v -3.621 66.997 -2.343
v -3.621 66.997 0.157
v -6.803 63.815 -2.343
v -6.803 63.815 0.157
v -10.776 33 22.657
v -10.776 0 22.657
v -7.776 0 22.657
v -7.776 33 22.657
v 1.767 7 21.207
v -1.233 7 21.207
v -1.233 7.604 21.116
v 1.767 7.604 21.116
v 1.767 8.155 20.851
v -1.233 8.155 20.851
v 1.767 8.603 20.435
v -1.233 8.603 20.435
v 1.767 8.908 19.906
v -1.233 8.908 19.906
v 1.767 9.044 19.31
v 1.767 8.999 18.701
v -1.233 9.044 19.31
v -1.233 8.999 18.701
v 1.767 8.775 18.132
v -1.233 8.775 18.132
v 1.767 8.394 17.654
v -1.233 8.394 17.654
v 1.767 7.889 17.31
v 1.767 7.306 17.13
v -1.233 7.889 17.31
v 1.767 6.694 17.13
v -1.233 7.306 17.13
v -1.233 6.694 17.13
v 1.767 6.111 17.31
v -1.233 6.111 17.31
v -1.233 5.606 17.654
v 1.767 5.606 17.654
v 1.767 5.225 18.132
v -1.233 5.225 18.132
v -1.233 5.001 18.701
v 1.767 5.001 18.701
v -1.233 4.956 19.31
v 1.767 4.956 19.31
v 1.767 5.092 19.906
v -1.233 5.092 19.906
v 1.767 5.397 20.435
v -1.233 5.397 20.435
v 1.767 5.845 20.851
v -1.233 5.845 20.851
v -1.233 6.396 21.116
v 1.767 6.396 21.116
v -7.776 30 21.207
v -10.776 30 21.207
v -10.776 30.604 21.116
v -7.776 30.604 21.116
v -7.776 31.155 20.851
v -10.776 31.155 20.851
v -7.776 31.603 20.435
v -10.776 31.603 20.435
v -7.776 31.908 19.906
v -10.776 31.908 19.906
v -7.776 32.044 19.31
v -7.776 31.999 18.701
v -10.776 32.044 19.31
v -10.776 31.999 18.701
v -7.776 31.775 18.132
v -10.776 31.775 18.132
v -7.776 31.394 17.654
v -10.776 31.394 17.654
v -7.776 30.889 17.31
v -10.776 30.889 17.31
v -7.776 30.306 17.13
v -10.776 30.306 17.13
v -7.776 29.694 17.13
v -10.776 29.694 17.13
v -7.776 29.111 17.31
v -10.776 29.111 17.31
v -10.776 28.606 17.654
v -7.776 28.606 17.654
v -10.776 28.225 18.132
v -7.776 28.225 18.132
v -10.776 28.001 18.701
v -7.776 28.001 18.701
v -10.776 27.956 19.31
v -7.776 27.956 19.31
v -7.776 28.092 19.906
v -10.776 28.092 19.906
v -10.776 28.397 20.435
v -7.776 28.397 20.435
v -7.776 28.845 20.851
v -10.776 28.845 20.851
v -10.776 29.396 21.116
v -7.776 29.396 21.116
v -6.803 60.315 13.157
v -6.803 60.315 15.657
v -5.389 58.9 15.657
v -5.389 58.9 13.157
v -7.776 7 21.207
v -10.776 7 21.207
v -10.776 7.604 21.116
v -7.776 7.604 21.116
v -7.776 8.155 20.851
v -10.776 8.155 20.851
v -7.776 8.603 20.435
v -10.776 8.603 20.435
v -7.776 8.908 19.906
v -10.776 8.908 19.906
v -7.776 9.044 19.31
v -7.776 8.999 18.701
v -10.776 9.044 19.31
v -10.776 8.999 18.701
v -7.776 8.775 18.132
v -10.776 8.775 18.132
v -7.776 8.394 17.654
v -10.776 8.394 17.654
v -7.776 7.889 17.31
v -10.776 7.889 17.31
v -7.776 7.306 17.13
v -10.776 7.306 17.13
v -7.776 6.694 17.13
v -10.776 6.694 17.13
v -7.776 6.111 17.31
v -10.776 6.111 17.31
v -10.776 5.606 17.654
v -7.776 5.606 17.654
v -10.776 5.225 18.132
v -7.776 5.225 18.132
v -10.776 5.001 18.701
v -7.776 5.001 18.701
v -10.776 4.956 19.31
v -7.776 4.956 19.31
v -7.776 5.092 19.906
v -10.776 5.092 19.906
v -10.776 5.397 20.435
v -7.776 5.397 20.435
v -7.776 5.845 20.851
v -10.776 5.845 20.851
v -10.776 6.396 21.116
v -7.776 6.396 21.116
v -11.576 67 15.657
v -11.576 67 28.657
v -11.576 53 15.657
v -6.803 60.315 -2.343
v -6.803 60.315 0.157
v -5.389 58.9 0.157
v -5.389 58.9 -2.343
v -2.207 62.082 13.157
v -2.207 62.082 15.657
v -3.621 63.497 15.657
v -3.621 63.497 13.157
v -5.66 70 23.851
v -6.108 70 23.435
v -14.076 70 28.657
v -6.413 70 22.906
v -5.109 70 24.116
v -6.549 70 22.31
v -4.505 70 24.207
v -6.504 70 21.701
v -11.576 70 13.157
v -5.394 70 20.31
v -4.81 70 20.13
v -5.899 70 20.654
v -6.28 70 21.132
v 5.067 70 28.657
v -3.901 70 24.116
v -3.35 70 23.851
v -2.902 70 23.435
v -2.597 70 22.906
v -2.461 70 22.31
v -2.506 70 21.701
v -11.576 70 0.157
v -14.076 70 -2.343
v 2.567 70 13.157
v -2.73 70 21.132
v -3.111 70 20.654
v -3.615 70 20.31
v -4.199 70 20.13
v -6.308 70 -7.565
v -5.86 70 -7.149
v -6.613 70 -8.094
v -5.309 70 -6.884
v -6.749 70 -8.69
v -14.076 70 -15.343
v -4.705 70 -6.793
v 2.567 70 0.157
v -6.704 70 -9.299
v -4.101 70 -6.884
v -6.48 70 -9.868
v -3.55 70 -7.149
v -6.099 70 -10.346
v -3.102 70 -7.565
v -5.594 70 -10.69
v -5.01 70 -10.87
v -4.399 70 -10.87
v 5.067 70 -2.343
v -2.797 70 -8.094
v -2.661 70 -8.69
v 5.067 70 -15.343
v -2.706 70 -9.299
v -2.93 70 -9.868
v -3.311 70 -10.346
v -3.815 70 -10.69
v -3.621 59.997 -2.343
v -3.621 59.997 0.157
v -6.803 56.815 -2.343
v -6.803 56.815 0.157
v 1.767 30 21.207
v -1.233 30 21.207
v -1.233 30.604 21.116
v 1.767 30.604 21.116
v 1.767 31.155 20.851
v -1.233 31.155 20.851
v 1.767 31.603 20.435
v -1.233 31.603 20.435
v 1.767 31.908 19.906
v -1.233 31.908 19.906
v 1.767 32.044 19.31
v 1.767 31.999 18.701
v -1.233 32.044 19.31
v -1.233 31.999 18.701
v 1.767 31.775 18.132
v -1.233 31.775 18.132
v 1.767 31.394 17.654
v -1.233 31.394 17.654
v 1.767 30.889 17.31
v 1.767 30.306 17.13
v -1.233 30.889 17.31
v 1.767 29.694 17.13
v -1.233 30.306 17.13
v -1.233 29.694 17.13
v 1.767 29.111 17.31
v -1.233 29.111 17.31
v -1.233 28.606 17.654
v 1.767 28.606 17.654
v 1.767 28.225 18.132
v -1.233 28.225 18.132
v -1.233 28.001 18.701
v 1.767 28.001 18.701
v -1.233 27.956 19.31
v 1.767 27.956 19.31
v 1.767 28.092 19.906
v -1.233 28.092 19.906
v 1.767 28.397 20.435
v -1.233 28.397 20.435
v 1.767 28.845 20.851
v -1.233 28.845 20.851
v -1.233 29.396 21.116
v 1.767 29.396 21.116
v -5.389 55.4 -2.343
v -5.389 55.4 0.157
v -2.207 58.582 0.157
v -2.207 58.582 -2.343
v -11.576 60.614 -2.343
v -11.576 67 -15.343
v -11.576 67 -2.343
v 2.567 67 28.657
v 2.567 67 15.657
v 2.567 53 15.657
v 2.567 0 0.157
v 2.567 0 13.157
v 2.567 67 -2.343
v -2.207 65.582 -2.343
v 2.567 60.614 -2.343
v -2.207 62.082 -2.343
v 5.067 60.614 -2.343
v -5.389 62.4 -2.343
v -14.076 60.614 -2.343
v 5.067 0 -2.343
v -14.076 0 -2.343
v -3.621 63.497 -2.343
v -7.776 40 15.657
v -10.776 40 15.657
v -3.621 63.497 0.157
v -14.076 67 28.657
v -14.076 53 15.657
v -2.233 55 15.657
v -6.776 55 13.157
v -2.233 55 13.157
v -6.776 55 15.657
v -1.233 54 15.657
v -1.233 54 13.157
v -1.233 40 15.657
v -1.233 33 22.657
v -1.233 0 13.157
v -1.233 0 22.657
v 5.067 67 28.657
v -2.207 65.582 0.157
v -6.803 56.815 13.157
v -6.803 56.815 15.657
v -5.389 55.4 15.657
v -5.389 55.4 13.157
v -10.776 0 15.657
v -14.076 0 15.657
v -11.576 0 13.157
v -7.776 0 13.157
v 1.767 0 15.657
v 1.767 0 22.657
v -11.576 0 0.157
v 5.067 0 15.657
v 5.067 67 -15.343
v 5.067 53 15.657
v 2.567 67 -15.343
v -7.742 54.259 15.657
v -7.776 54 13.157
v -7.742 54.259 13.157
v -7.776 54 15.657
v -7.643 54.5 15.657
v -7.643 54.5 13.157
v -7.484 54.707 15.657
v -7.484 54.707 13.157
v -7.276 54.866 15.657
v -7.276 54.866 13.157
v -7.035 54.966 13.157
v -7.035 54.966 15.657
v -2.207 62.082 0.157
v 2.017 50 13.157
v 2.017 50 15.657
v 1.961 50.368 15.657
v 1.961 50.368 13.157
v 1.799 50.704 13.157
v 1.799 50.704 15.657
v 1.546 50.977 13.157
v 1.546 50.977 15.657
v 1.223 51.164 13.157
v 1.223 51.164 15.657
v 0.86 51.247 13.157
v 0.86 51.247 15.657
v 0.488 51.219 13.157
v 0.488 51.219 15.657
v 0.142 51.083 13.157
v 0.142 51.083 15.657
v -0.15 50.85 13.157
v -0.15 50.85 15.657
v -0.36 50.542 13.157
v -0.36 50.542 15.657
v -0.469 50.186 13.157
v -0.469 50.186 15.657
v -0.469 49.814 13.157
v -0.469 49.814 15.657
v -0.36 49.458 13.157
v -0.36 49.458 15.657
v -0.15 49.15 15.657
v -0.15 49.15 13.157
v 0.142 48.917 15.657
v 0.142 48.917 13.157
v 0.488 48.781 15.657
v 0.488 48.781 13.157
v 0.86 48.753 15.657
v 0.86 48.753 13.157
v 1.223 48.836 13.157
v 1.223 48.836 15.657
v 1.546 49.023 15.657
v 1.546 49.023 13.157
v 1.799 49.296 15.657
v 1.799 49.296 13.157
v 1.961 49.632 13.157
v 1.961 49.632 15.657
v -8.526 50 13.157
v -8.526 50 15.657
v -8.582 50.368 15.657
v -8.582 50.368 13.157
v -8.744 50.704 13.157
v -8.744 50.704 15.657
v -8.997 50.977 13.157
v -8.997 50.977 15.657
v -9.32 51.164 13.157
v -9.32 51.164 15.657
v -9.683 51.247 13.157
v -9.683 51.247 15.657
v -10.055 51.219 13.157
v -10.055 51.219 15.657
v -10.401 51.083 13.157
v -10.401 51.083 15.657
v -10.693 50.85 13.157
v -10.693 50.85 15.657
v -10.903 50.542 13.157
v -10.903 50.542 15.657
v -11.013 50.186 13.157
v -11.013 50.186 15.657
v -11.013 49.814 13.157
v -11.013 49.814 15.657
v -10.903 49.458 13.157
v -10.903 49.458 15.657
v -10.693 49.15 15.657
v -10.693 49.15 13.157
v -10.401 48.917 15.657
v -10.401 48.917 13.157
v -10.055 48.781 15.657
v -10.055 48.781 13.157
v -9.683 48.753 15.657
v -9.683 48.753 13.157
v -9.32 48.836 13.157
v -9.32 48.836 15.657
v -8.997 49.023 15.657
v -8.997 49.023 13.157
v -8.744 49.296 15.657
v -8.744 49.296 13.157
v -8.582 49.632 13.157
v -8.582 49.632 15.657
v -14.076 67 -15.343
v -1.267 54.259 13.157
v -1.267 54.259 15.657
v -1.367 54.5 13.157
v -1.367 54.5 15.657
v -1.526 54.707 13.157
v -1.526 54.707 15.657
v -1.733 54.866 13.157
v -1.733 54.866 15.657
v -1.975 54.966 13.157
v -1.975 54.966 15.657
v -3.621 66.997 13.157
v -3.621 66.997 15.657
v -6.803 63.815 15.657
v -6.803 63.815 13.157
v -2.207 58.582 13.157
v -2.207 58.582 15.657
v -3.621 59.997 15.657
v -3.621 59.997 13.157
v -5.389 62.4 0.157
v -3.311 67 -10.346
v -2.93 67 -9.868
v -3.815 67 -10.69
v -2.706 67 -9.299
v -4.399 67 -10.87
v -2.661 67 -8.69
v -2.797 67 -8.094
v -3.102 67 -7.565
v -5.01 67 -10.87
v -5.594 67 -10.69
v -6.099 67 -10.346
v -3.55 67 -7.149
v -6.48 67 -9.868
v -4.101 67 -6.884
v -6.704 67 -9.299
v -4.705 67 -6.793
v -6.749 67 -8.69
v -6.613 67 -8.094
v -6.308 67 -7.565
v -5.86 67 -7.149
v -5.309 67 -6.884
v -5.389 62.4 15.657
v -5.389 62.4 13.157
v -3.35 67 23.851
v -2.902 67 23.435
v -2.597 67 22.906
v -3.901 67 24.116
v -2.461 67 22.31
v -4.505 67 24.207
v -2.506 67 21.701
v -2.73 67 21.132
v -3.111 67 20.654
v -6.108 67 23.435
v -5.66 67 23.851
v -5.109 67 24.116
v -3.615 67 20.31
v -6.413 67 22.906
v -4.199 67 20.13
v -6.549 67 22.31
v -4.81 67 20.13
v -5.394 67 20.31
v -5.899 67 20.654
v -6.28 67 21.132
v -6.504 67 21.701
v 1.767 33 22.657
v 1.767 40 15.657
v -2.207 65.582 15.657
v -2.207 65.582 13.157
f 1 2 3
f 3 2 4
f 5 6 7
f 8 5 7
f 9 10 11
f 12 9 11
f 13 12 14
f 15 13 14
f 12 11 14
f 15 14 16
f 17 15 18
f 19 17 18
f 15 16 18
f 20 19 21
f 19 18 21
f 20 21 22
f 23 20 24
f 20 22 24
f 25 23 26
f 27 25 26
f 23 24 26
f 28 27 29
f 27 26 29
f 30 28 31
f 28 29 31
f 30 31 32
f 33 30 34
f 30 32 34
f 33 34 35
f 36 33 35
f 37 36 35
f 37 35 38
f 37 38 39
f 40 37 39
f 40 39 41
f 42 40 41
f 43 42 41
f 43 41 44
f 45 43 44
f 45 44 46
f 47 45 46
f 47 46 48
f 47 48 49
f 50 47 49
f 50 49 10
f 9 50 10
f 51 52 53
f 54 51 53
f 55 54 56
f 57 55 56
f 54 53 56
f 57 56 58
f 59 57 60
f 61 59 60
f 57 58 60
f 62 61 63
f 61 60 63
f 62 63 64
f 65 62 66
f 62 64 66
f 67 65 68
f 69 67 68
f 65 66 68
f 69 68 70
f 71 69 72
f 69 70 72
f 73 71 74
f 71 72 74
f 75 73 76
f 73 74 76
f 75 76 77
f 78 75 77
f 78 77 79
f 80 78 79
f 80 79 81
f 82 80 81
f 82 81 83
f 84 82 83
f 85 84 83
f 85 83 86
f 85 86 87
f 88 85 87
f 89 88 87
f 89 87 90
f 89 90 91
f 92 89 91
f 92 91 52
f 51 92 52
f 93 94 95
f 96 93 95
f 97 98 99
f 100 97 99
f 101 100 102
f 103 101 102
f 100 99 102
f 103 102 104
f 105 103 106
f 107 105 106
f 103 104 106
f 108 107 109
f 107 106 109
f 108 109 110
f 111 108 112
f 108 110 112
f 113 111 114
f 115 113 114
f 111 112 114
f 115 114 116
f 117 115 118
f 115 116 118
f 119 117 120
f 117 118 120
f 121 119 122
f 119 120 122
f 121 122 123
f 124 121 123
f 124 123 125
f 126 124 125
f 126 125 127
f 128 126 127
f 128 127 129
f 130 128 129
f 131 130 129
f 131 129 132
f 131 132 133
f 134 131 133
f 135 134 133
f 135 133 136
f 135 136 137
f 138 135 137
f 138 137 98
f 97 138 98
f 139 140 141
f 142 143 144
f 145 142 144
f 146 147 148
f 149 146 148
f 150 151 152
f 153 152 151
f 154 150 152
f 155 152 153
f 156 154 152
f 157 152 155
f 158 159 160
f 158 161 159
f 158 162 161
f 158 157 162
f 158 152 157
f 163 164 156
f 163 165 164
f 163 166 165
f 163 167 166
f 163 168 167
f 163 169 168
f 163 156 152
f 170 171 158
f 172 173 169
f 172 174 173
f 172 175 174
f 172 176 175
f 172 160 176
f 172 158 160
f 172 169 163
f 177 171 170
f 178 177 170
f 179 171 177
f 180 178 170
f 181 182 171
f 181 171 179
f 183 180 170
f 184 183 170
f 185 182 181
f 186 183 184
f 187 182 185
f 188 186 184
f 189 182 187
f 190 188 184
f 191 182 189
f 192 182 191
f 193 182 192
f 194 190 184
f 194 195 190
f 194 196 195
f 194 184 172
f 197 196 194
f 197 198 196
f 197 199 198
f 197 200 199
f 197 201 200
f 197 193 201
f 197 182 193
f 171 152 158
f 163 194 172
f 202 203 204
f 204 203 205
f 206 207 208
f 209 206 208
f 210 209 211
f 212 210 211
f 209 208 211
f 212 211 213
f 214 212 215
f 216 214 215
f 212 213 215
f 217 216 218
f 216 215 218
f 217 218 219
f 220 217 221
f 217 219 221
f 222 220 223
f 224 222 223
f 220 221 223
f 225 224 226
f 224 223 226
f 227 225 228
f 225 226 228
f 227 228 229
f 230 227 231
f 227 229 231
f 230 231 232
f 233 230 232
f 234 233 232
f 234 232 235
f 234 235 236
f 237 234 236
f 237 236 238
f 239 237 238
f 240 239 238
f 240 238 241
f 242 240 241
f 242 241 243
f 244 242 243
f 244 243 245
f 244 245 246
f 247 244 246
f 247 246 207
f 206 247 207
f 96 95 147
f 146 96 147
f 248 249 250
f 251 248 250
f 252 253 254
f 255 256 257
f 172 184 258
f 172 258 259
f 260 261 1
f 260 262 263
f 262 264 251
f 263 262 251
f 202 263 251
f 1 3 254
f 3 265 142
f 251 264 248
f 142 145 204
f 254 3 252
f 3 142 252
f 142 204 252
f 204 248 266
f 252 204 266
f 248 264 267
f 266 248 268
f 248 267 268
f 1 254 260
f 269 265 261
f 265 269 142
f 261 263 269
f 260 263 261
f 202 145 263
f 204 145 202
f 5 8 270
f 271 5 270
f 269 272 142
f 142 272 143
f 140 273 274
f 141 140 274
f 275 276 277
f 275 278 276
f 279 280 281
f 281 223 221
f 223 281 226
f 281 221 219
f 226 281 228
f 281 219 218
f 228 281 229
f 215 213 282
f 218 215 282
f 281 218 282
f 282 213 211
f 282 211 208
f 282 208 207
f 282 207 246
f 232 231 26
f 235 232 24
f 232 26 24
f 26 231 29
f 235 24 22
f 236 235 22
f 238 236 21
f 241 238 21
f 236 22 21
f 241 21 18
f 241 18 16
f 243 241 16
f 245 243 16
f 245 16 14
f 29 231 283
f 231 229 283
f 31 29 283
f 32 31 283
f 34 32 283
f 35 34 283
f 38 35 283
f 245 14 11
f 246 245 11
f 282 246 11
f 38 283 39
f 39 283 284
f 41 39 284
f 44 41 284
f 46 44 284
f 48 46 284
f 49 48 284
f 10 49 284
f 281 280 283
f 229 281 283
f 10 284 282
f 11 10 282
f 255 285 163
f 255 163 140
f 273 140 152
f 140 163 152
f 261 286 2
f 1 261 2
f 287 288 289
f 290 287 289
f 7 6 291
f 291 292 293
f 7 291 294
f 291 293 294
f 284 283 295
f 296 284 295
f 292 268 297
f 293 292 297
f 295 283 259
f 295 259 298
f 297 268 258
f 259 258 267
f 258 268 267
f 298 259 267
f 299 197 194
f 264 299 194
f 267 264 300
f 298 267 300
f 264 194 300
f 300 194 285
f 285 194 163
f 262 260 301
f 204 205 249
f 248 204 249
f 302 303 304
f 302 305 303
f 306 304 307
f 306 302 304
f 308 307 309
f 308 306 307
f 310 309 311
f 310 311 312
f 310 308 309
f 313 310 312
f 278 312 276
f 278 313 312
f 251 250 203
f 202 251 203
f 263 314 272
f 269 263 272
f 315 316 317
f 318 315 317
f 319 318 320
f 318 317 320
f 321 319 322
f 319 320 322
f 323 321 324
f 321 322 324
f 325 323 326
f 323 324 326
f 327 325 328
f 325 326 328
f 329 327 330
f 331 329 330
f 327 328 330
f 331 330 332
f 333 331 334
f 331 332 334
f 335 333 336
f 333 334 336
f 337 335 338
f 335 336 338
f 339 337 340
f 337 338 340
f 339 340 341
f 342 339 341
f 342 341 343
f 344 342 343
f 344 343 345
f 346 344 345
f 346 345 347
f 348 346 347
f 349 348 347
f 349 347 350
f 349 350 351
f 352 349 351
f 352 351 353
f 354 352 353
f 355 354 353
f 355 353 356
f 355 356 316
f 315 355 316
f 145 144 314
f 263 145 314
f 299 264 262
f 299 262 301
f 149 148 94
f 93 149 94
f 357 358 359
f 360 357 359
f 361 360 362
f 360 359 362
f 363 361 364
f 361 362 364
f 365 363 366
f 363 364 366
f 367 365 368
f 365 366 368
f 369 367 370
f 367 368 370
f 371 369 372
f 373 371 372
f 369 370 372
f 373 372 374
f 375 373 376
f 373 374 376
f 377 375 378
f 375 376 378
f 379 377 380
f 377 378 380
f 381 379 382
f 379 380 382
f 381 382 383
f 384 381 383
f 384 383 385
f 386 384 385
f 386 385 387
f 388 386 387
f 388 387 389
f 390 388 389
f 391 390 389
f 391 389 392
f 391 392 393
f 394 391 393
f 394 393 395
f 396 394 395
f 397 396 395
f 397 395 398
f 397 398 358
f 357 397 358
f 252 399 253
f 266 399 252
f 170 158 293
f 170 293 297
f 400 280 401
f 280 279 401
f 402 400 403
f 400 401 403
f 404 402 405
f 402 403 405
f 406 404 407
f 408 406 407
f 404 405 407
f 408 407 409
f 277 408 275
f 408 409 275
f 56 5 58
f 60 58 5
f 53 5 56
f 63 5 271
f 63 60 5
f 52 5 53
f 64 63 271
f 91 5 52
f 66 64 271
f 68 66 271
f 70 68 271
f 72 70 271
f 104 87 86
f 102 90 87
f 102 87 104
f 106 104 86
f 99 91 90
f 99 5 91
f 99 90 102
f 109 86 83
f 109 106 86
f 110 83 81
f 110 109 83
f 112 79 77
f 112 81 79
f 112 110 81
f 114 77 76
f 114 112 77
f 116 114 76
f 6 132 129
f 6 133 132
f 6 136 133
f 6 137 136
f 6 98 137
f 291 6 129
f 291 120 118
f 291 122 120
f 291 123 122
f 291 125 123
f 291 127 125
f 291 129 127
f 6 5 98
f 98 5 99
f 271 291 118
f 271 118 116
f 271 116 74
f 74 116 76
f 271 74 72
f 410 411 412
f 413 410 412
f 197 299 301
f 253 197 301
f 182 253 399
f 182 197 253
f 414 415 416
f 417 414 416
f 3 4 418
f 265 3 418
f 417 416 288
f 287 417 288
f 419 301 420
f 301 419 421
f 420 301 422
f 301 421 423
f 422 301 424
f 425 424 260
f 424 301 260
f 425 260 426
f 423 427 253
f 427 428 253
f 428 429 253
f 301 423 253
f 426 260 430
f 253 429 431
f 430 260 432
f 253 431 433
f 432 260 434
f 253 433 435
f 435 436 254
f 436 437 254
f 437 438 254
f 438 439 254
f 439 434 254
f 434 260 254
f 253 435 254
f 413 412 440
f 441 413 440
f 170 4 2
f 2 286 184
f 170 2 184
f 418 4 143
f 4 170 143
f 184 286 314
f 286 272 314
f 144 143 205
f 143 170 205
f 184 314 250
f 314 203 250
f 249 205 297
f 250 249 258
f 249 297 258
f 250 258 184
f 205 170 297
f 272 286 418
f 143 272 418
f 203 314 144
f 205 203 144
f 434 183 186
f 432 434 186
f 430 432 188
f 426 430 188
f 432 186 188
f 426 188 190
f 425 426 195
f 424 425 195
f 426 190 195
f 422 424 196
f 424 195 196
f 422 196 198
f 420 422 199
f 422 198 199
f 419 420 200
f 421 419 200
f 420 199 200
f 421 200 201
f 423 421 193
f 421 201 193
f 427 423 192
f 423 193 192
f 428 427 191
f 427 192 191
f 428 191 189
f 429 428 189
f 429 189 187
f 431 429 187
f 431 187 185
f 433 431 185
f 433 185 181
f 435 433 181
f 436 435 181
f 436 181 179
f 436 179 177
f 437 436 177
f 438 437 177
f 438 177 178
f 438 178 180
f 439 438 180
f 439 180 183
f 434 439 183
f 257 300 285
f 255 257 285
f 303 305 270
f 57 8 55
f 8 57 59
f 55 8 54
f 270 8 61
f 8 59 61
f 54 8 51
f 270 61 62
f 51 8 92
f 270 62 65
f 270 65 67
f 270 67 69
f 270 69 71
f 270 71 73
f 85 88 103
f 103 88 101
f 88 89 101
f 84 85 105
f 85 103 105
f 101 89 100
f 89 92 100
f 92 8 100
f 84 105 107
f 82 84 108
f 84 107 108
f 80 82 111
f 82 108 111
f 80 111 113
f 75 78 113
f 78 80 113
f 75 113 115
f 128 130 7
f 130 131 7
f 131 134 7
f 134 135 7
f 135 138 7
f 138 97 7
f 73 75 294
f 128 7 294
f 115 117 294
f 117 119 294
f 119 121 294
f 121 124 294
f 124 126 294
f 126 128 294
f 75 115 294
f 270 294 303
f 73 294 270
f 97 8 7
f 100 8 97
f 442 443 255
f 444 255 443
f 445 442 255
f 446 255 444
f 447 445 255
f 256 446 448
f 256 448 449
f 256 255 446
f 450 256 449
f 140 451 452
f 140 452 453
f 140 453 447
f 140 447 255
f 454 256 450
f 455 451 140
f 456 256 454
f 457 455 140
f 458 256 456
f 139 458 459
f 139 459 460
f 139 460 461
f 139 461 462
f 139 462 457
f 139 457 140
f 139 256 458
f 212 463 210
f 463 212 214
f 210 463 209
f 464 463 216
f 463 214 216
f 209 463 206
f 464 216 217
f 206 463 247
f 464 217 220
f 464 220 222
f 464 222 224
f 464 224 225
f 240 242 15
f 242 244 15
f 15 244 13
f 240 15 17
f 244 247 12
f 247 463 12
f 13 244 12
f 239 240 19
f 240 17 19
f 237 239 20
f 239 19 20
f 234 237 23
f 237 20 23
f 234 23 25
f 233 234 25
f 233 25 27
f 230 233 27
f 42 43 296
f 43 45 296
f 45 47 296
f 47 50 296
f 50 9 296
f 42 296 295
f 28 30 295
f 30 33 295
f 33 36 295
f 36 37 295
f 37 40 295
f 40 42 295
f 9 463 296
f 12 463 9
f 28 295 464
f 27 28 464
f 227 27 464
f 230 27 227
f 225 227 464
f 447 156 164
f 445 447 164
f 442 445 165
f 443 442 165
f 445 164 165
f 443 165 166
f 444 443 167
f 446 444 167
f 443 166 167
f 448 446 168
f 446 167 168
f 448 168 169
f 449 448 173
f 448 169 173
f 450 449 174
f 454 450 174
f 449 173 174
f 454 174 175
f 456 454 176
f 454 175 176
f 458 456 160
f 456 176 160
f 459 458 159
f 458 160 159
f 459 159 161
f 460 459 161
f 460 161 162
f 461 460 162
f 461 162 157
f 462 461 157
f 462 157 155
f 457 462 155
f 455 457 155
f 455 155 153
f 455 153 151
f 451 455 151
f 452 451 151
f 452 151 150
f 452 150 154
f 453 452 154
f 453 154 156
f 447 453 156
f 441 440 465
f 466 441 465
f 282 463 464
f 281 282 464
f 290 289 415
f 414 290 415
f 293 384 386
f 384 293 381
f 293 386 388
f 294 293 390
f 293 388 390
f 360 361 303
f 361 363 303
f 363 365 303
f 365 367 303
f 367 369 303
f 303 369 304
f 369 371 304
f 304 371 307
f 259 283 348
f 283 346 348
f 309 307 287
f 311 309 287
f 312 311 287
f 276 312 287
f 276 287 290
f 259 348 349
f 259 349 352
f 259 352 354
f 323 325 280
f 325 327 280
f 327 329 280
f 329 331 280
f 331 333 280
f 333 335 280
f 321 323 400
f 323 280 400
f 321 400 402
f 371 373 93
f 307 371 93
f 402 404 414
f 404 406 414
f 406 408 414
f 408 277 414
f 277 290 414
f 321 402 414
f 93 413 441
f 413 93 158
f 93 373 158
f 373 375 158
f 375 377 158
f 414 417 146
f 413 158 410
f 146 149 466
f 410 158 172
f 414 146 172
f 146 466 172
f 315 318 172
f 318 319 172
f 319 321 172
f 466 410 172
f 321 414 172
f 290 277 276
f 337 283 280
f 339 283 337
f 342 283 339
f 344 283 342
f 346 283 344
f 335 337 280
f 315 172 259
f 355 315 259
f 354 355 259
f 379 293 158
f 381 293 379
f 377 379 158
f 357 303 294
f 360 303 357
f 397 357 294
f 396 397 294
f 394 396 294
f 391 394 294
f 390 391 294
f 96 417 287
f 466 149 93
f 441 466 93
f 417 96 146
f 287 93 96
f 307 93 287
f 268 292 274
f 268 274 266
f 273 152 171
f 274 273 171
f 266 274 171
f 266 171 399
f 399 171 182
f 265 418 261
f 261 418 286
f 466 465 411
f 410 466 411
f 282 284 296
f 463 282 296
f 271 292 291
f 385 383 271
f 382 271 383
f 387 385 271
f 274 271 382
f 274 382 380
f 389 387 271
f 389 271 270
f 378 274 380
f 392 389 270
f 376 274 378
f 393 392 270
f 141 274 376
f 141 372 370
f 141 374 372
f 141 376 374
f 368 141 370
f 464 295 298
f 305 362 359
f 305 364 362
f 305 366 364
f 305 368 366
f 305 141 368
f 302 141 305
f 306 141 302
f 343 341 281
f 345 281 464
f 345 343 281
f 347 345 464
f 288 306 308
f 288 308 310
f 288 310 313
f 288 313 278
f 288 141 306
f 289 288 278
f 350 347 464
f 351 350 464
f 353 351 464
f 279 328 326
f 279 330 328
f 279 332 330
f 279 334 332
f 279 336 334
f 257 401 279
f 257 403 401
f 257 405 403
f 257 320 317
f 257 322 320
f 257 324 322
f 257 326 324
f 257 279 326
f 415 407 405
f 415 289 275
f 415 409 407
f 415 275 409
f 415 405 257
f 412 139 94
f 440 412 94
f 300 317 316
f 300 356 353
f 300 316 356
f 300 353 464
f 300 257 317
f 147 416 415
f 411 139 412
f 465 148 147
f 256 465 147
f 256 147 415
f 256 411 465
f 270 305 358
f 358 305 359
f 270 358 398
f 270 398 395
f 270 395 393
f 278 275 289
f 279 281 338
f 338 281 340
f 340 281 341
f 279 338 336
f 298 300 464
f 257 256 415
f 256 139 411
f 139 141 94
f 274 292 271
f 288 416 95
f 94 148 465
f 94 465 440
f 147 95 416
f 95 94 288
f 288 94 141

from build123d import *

# Parameters (mm, degrees)
SKETCH2_W                = 2.5
SKETCH2_H                = 2.5
SKETCH2_W_2              = 14.143059905
SKETCH2_H_2              = 13
SKETCH2_W_3              = 3
SKETCH2_H_3              = 7
BOSS_EXTRUDE1_DEPTH      = 40
SKETCH3_R                = 2.05
CUT_EXTRUDE2_DEPTH       = 40
BOSS_EXTRUDE11_DEPTH     = 30
SKETCH16_R               = 1.25
CUT_EXTRUDE9_DEPTH       = 3.5
SKETCH17_R               = 1.25
CUT_EXTRUDE10_DEPTH      = 3.5
SKETCH18_W               = 19.143059905
SKETCH18_H               = 3
BOSS_EXTRUDE4_DEPTH      = 15.5
BOSS_EXTRUDE5_DEPTH      = 13
BOSS_EXTRUDE5_DEPTH_BACK = 2
SKETCH19_W               = 19.143059905
SKETCH19_H               = 3
BOSS_EXTRUDE6_DEPTH      = 2.5
BOSS_EXTRUDE8_DEPTH      = 2.5
BOSS_EXTRUDE9_DEPTH      = 2.5
BOSS_EXTRUDE10_DEPTH     = 2.5
SKETCH25_R               = 2.05
CUT_EXTRUDE12_DEPTH      = 3.5
SKETCH27_W               = 6.543059905
SKETCH27_H               = 2.5
BOSS_EXTRUDE12_DEPTH     = 12
FILLET1_R                = 1
CUT_EXTRUDE13_DEPTH      = 78.840525416
CUT_EXTRUDE14_DEPTH      = 78.280272448


with BuildPart() as part:
    # Sketch2 → Boss-Extrude1 (new body)
    with BuildSketch(Plane(origin=(0, 0, 0), x_dir=(1, 0, 0), z_dir=(0, 1, 0))):
        with Locations((-12.826483829, 1.092750264)):
            Rectangle(SKETCH2_W, SKETCH2_H)
        with Locations((-4.504953877, 1.092750264)):
            Rectangle(SKETCH2_W_2, SKETCH2_H)
        with Locations((-12.826483829, -6.657249736)):
            Rectangle(SKETCH2_W, SKETCH2_H_2)
        with Locations((3.816576076, 1.092750264)):
            Rectangle(SKETCH2_W, SKETCH2_H)
        Polygon((-11.576483829, -13.157249736), (-14.076483829, -13.157249736), (-14.076483829, -15.657249736), (-10.776483829, -15.657249736), (-7.776483829, -15.657249736), (-7.776483829, -13.157249736), align=None)
        with Locations((3.816576076, -6.657249736)):
            Rectangle(SKETCH2_W, SKETCH2_H_2)
        Polygon((5.066576076, -13.157249736), (2.566576076, -13.157249736), (-1.233423924, -13.157249736), (-1.233423924, -15.657249736), (1.766576076, -15.657249736), (5.066576076, -15.657249736), align=None)
        with Locations((-9.276483829, -19.157249736)):
            Rectangle(SKETCH2_W_3, SKETCH2_H_3)
        with Locations((0.266576076, -19.157249736)):
            Rectangle(SKETCH2_W_3, SKETCH2_H_3)
    extrude(amount=BOSS_EXTRUDE1_DEPTH)

    # Sketch3 → Cut-Extrude2 (cut)
    with BuildSketch(Plane.ZY.offset(10.776483829)):
        with Locations((19.157249736, 30)):
            Circle(SKETCH3_R)
        with Locations((19.157249736, 7)):
            Circle(SKETCH3_R)
    extrude(amount=-CUT_EXTRUDE2_DEPTH, mode=Mode.SUBTRACT)

    # Sketch26 → Boss-Extrude11 (add)
    with BuildSketch(Plane(origin=(0, 40, 0), x_dir=(1, 0, 0), z_dir=(0, 1, 0))):
        Polygon((-1.233423924, -15.657249736), (1.766576076, -15.657249736), (5.066576076, -15.657249736), (5.066576076, 2.342750264), (-14.076483829, 2.342750264), (-14.076483829, -15.657249736), (-7.776483829, -15.657249736), (-7.776483829, -13.157249736), (-11.576483829, -13.157249736), (-11.576483829, -0.157249736), (2.566576076, -0.157249736), (2.566576076, -13.157249736), (-1.233423924, -13.157249736), align=None)
    extrude(amount=BOSS_EXTRUDE11_DEPTH)

    # Sketch16 → Cut-Extrude9 (cut)
    with BuildSketch(Plane.XY.offset(15.657249736)):
        with Locations((-9.776483829, 50)):
            Circle(SKETCH16_R)
    extrude(amount=-CUT_EXTRUDE9_DEPTH, mode=Mode.SUBTRACT)

    # Sketch17 → Cut-Extrude10 (cut)
    with BuildSketch(Plane.XY.offset(15.657249736)):
        with Locations((0.766576076, 50)):
            Circle(SKETCH17_R)
    extrude(amount=-CUT_EXTRUDE10_DEPTH, mode=Mode.SUBTRACT)

    # Sketch18 → Boss-Extrude4 (add)
    with BuildSketch(Plane(origin=(0, 0, 13.157249736), x_dir=(-1, 0, 0), z_dir=(0, 0, -1))):
        with Locations((4.504953877, 68.5)):
            Rectangle(SKETCH18_W, SKETCH18_H)
    extrude(amount=-BOSS_EXTRUDE4_DEPTH)

    # Sketch19 → Boss-Extrude5 (add, two sides: drawn at the far end of the back side and taken through both)
    with BuildSketch(Plane(origin=(0, 0, -2.342750264), x_dir=(-1, 0, 0), z_dir=(0, 0, -1)).offset(-BOSS_EXTRUDE5_DEPTH_BACK)):
        with Locations((4.504953877, 68.5)):
            Rectangle(SKETCH19_W, SKETCH19_H)
    extrude(amount=BOSS_EXTRUDE5_DEPTH + BOSS_EXTRUDE5_DEPTH_BACK)

    # Sketch21 → Boss-Extrude6 (add)
    with BuildSketch(Plane.ZY.offset(14.076483829)):
        Polygon((28.657249736, 67), (15.657249736, 53), (15.657249736, 67), align=None)
    extrude(amount=-BOSS_EXTRUDE6_DEPTH)

    # Sketch22 → Boss-Extrude8 (add)
    with BuildSketch(Plane(origin=(5.066576076, 0, 0), x_dir=(0, 0, -1), z_dir=(1, 0, 0))):
        Polygon((-28.657249736, 67), (-15.657249736, 67), (-15.657249736, 53), align=None)
    extrude(amount=-BOSS_EXTRUDE8_DEPTH)

    # Sketch23 → Boss-Extrude9 (add)
    with BuildSketch(Plane(origin=(5.066576076, 0, 0), x_dir=(0, 0, -1), z_dir=(1, 0, 0))):
        Polygon((-13.157249736, 70), (-13.157249736, 53), (15.342750264, 67), (15.342750264, 70), align=None)
    extrude(amount=-BOSS_EXTRUDE9_DEPTH)

    # Sketch24 → Boss-Extrude10 (add)
    with BuildSketch(Plane.ZY.offset(14.076483829)):
        Polygon((13.157249736, 70), (-15.342750264, 70), (-15.342750264, 67), (13.157249736, 53), align=None)
    extrude(amount=-BOSS_EXTRUDE10_DEPTH)

    # Sketch25 → Cut-Extrude12 (cut)
    with BuildSketch(Plane(origin=(0, 70, 0), x_dir=(1, 0, 0), z_dir=(0, 1, 0))):
        with Locations(Location((-4.704953829, 8.842750264, 0), (0, 0, 270))):
            Circle(SKETCH25_R)
        with Locations(Location((-4.504953767, -22.157249736, 0), (0, 0, 270))):
            Circle(SKETCH25_R)
    extrude(amount=-CUT_EXTRUDE12_DEPTH, mode=Mode.SUBTRACT)

    # Sketch27 → Boss-Extrude12 (add)
    with BuildSketch(Plane.XZ.offset(-67)):
        with Locations((-4.504953877, 14.407249736)):
            Rectangle(SKETCH27_W, SKETCH27_H)
    extrude(amount=BOSS_EXTRUDE12_DEPTH)

    # Fillet1
    fillet1_edges = [part.edges().sort_by_distance(p)[0] for p in [
        (-1.233423924, 55, 14.407249736),
        (-7.776483829, 55, 14.407249736),
    ]]
    fillet(fillet1_edges, radius=FILLET1_R)

    # Sketch28 → Cut-Extrude13 (cut, through all)
    with BuildSketch(Plane.XY.offset(15.657249736)):
        Polygon((-3.621040447, 66.996521667), (-6.803020962, 63.814541152), (-5.3888074, 62.40032759), (-2.206826885, 65.582308105), align=None)
        Polygon((-3.621040447, 63.496521667), (-6.803020962, 60.314541152), (-5.3888074, 58.90032759), (-2.206826885, 62.082308105), align=None)
        Polygon((-3.621040447, 59.996521667), (-6.803020962, 56.814541152), (-5.3888074, 55.40032759), (-2.206826885, 58.582308105), align=None)
    extrude(amount=-CUT_EXTRUDE13_DEPTH, mode=Mode.SUBTRACT)

    # Sketch29 → Cut-Extrude14 (cut, through all)
    with BuildSketch(Plane(origin=(1.766576076, 0, 0), x_dir=(0, 0, -1), z_dir=(1, 0, 0))):
        Polygon((-15.657249736, 40), (-22.657249736, 40), (-22.657249736, 33), align=None)
    extrude(amount=-CUT_EXTRUDE14_DEPTH, mode=Mode.SUBTRACT)


solid = part.part
